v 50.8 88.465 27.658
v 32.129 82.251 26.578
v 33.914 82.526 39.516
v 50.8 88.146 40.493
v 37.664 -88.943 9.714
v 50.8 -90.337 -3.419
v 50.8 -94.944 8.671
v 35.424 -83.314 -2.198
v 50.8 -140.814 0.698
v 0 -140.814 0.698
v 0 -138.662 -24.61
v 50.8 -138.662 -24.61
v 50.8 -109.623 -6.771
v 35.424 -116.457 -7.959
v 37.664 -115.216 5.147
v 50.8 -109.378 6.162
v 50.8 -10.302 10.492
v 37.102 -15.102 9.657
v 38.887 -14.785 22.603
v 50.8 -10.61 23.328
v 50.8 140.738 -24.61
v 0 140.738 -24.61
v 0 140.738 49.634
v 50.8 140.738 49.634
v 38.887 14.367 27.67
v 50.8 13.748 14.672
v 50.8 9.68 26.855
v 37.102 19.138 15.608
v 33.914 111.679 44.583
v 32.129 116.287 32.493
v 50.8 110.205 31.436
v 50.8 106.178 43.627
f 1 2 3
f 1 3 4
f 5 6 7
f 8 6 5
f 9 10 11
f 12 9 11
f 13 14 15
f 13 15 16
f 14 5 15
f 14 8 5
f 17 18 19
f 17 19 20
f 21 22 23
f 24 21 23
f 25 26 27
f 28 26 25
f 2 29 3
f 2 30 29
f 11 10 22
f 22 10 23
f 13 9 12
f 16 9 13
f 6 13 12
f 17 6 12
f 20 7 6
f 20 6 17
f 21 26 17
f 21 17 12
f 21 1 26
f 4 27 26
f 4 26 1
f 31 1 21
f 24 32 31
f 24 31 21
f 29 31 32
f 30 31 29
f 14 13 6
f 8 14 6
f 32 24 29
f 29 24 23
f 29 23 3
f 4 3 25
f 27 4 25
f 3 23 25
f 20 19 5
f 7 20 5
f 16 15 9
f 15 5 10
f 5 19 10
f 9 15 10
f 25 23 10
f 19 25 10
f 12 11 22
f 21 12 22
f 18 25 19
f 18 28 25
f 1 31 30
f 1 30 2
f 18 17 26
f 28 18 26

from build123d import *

# Parameters (mm, degrees)
F1_DEPTH = 50.8
F4_DEPTH = 12.7
F4_TAPER = -8
F6_DEPTH = 12.7
F6_TAPER = -10


with BuildPart() as f1:
    # F0 (on Right) → F1 (new body)
    with BuildSketch(Plane.YZ):
        Polygon((-140.8138120502, 0.6983735914), (-138.6619785664, -24.6103129146), (140.7380214336, -24.6103129146), (140.7380214336, 49.6335022594), align=None)
    extrude(amount=F1_DEPTH)

    # F3 (on face) → F4 (cut)
    with BuildSketch(Plane(origin=(0, -4.2468228402, 24.4344050926), x_dir=(1, 0, 0), z_dir=(0, -0.1712378928, 0.9852297113))):
        Polygon((33.9139047941, 117.6632965604), (33.9139047941, 88.0739117662), (50.8, 93.7783047557), (50.8, 112.0805814862), align=None)
        Polygon((50.8, -6.458433345), (50.8, 14.1357549945), (38.8870903277, 18.8930730025), (38.8870903277, -10.6963117917), align=None)
    extrude(amount=-F4_DEPTH, taper=F4_TAPER, mode=Mode.SUBTRACT)

    # F5 (on face) → F6 (cut)
    with BuildSketch(Plane(origin=(0, -4.2468228402, 24.4344050926), x_dir=(1, 0, 0), z_dir=(0, -0.1712378928, 0.9852297113))):
        Polygon((37.663642931, -112.632855773), (50.8, -106.7069470882), (50.8, -92.0567885041), (37.663642931, -85.9662666917), align=None)
    extrude(amount=-F6_DEPTH, taper=F6_TAPER, mode=Mode.SUBTRACT)


solid = f1.part
